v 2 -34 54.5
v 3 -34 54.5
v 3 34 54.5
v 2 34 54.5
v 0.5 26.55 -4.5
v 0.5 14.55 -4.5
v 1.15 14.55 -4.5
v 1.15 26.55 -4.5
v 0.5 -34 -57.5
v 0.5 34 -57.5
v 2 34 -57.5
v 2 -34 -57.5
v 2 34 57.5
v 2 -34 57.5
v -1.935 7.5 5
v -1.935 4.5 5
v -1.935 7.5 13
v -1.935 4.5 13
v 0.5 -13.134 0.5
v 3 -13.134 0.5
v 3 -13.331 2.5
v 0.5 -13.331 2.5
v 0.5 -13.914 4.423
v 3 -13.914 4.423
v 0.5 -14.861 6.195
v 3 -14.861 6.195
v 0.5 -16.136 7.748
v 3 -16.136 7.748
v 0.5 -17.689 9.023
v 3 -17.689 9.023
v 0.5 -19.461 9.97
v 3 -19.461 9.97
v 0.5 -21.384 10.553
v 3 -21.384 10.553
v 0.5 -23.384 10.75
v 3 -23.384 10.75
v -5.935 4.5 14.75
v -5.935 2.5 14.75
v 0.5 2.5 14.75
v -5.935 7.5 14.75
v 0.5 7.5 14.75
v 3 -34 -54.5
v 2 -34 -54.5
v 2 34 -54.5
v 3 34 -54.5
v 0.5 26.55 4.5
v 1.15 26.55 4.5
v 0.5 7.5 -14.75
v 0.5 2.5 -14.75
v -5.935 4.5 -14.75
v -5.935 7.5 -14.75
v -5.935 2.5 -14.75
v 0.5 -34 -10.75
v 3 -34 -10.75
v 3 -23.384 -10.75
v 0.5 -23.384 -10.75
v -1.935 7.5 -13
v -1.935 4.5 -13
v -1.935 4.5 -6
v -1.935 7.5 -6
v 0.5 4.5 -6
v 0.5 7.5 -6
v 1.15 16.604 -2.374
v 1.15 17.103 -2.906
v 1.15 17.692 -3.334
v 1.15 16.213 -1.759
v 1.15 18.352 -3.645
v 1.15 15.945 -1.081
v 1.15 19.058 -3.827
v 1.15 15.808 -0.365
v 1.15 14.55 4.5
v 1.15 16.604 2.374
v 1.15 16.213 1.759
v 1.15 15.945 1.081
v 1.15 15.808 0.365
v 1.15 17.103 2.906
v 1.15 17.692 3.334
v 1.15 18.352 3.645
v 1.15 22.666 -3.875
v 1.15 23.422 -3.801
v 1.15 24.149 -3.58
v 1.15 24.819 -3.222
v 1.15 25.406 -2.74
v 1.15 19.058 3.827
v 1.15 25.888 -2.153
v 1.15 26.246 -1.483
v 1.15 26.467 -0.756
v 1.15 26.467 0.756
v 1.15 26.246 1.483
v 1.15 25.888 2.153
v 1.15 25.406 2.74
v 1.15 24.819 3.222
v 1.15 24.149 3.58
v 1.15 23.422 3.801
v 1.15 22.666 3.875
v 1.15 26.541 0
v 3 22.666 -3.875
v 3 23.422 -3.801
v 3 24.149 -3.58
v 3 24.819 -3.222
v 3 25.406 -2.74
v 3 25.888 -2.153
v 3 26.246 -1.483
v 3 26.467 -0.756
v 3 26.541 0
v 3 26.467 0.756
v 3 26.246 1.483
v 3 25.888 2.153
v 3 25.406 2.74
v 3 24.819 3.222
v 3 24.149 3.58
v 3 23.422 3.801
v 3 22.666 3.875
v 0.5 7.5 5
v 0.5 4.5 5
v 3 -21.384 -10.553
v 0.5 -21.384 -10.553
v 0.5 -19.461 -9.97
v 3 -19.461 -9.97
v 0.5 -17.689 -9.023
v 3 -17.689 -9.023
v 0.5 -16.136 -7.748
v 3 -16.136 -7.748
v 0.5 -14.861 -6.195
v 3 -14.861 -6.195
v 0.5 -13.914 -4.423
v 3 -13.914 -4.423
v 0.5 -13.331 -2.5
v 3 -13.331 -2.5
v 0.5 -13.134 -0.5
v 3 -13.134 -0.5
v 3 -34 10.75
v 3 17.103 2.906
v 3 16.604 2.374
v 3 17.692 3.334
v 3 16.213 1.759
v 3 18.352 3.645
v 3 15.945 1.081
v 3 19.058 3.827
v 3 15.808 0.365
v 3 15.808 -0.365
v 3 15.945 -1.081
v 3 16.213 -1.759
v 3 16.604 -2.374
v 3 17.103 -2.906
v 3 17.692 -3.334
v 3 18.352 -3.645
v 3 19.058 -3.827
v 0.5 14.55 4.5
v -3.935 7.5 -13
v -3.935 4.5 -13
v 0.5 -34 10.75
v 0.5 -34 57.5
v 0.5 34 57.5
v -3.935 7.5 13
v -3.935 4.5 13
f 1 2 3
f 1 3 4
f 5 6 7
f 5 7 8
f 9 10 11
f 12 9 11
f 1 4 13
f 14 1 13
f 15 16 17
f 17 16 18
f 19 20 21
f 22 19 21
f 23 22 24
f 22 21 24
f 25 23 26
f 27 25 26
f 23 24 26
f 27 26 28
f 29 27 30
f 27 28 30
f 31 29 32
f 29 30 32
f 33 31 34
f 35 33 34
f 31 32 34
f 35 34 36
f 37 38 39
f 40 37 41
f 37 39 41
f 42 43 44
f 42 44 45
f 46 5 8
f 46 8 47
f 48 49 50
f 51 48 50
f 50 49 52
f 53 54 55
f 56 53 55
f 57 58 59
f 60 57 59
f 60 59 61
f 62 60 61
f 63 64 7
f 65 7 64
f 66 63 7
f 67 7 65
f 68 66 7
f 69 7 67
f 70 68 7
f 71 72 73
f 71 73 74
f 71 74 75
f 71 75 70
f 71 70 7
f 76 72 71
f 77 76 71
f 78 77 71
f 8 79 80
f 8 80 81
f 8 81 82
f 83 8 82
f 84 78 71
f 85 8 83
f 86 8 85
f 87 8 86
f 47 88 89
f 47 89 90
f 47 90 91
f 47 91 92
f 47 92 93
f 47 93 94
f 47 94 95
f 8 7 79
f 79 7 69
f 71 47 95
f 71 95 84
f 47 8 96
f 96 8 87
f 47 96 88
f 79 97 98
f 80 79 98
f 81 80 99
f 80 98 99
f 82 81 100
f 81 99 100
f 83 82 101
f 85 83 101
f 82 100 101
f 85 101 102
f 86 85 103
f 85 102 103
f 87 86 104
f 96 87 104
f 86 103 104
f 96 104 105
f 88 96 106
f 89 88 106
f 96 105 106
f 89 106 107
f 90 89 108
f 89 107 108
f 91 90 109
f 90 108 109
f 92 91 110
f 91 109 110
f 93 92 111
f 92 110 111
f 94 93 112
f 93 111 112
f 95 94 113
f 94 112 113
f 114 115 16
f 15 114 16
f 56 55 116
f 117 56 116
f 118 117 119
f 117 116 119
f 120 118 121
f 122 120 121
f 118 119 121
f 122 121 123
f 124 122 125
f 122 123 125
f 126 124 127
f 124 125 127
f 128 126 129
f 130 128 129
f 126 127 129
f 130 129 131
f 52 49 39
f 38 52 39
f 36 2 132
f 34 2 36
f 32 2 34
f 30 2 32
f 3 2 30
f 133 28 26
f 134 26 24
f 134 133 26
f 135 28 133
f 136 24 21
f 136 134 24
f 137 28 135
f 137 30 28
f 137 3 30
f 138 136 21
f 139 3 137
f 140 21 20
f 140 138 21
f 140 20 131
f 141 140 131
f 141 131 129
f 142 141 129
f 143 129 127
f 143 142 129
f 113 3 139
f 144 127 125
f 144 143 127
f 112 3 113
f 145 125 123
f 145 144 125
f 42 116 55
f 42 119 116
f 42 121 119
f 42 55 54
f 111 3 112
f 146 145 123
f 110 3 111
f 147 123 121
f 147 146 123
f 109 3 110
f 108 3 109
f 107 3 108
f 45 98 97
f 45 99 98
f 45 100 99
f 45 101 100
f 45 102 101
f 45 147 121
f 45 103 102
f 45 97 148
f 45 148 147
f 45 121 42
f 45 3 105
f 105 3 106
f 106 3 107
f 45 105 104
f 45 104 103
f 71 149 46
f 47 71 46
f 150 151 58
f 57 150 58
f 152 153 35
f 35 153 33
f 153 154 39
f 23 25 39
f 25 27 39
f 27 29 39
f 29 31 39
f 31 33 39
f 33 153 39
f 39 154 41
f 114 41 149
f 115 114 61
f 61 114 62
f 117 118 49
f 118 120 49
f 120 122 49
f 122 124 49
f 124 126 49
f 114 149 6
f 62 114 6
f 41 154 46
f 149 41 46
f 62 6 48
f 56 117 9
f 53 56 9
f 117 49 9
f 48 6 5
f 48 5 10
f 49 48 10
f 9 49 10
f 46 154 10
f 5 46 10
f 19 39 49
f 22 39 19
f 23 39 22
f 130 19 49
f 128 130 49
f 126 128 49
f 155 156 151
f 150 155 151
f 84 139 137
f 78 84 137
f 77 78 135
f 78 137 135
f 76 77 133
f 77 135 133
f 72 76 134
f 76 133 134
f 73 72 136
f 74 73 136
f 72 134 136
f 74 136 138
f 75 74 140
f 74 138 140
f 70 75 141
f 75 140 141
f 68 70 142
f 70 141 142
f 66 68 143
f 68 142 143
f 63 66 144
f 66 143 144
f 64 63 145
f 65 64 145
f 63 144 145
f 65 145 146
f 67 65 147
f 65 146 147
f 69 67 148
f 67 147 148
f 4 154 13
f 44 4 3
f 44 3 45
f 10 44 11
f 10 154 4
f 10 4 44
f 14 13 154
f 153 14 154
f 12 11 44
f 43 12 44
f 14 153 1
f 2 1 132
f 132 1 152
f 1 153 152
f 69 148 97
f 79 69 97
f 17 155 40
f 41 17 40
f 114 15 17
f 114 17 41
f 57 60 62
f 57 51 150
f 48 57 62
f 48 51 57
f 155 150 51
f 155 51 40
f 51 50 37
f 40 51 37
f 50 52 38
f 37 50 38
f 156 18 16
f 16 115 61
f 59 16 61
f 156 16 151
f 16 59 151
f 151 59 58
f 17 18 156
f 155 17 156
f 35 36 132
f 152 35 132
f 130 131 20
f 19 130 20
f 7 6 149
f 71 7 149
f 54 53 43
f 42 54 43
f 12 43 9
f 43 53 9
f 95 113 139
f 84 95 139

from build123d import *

# Parameters (mm, degrees)
SKETCH_1_W           = 120
SKETCH_1_H           = 68
EXTRUDE_1_DEPTH      = 3
CUT_EXTRUDE_1_DEPTH  = 91.735880444
CUT_EXTRUDE_7_DEPTH  = 2.5
CUT_EXTRUDE_10_DEPTH = 2.5
SKETCH_17_W          = 9
SKETCH_17_H          = 12
CUT_EXTRUDE_11_DEPTH = 0.65
EXTRUDE_2_DEPTH      = 8
SKETCH_19_W          = 1.564505321
SKETCH_19_H          = 29.5
CUT_EXTRUDE_12_DEPTH = 8
EXTRUDE_3_DEPTH      = 3


with BuildPart() as part:
    # 스케치1 → 보스-돌출1 (new body)
    with BuildSketch(Plane(origin=(0, 0, 0), x_dir=(0, 0, -1), z_dir=(1, 0, 0))):
        Rectangle(SKETCH_1_W, SKETCH_1_H)
    extrude(amount=EXTRUDE_1_DEPTH)

    # 스케치2 → 컷-돌출1 (cut, through all)
    with BuildSketch(Plane(origin=(0, 34, 0), x_dir=(1, 0, 0), z_dir=(0, 1, 0))):
        Polygon((0.5, -60), (0.5, -57.5), (0.5, 0), (0, 0), (0, -60), align=None)
        Polygon((2, -57.5), (0.5, -57.5), (0.5, -60), (3, -60), (3, -54.5), (2, -54.5), align=None)
        Polygon((0.5, 60), (0.5, 57.5), (2, 57.5), (2, 54.5), (3, 54.5), (3, 60), align=None)
        Polygon((0, 0), (0.5, 0), (0.5, 57.5), (0.5, 60), (0, 60), align=None)
    extrude(amount=-CUT_EXTRUDE_1_DEPTH, mode=Mode.SUBTRACT)

    # 스케치7 → 컷-돌출7 (cut)
    with BuildSketch(Plane(origin=(3, 0, 0), x_dir=(0, 0, -1), z_dir=(1, 0, 0))):
        with BuildLine():
            Line((0.5, -13.133811576), (-0.5, -13.133811576))
            ThreePointArc((-0.5, -13.133811576), (-7.747844507, -16.135967068), (-10.75, -23.383811576))
            Line((-10.75, -23.383811576), (-10.75, -34))
            Line((-10.75, -34), (10.75, -34))
            Line((10.75, -34), (10.75, -23.383811576))
            ThreePointArc((10.75, -23.383811576), (7.747844507, -16.135967068), (0.5, -13.133811576))
        make_face()
    extrude(amount=-CUT_EXTRUDE_7_DEPTH, mode=Mode.SUBTRACT)

    # 스케치16 → 컷-돌출10 (cut)
    with BuildSketch(Plane(origin=(3, 0, 0), x_dir=(0, 0, -1), z_dir=(1, 0, 0))):
        with BuildLine():
            Line((-3.875, 22.666188424), (-3.82691794, 19.057645835))
            ThreePointArc((-3.82691794, 19.057645835), (0, 15.791188424), (3.82691794, 19.057645835))
            Line((3.82691794, 19.057645835), (3.875, 22.666188424))
            ThreePointArc((3.875, 22.666188424), (0, 26.541188424), (-3.875, 22.666188424))
        make_face()
    extrude(amount=-CUT_EXTRUDE_10_DEPTH, mode=Mode.SUBTRACT)

    # 스케치17 → 컷-돌출11 (cut)
    with BuildSketch(Plane.ZY.offset(-0.5)):
        with Locations((0, 20.55)):
            Rectangle(SKETCH_17_W, SKETCH_17_H)
    extrude(amount=-CUT_EXTRUDE_11_DEPTH, mode=Mode.SUBTRACT)

    # 스케치18 → 보스-돌출2 (add)
    with BuildSketch(Plane.ZY.offset(-0.5)):
        Polygon((-12.5, 4.5), (-14.75, 4.5), (-14.75, 2.5), (0, 2.5), (0, 4.5), align=None)
        Polygon((12.5, 4.5), (0, 4.5), (0, 2.5), (14.75, 2.5), (14.75, 4.5), align=None)
    extrude(amount=EXTRUDE_2_DEPTH)

    # 스케치19 → 컷-돌출12 (cut)
    with BuildSketch(Plane(origin=(0, 4.5, 0), x_dir=(1, 0, 0), z_dir=(0, 1, 0))):
        with Locations((-6.71774734, 0)):
            Rectangle(SKETCH_19_W, SKETCH_19_H)
    extrude(amount=-CUT_EXTRUDE_12_DEPTH, mode=Mode.SUBTRACT)

    # 스케치19<3> → 보스-돌출3 (add)
    with BuildSketch(Plane(origin=(0, 4.5, 0), x_dir=(1, 0, 0), z_dir=(0, 1, 0))):
        Polygon((0.5, 6), (0.5, 14.75), (-5.935494679, 14.75), (-5.935494679, -14.75), (0.5, -14.75), (0.5, -5), (-1.935494679, -5), (-1.935494679, -13), (-3.935494679, -13), (-3.935494679, 13), (-1.935494679, 13), (-1.935494679, 6), align=None)
    extrude(amount=EXTRUDE_3_DEPTH)


solid = part.part
